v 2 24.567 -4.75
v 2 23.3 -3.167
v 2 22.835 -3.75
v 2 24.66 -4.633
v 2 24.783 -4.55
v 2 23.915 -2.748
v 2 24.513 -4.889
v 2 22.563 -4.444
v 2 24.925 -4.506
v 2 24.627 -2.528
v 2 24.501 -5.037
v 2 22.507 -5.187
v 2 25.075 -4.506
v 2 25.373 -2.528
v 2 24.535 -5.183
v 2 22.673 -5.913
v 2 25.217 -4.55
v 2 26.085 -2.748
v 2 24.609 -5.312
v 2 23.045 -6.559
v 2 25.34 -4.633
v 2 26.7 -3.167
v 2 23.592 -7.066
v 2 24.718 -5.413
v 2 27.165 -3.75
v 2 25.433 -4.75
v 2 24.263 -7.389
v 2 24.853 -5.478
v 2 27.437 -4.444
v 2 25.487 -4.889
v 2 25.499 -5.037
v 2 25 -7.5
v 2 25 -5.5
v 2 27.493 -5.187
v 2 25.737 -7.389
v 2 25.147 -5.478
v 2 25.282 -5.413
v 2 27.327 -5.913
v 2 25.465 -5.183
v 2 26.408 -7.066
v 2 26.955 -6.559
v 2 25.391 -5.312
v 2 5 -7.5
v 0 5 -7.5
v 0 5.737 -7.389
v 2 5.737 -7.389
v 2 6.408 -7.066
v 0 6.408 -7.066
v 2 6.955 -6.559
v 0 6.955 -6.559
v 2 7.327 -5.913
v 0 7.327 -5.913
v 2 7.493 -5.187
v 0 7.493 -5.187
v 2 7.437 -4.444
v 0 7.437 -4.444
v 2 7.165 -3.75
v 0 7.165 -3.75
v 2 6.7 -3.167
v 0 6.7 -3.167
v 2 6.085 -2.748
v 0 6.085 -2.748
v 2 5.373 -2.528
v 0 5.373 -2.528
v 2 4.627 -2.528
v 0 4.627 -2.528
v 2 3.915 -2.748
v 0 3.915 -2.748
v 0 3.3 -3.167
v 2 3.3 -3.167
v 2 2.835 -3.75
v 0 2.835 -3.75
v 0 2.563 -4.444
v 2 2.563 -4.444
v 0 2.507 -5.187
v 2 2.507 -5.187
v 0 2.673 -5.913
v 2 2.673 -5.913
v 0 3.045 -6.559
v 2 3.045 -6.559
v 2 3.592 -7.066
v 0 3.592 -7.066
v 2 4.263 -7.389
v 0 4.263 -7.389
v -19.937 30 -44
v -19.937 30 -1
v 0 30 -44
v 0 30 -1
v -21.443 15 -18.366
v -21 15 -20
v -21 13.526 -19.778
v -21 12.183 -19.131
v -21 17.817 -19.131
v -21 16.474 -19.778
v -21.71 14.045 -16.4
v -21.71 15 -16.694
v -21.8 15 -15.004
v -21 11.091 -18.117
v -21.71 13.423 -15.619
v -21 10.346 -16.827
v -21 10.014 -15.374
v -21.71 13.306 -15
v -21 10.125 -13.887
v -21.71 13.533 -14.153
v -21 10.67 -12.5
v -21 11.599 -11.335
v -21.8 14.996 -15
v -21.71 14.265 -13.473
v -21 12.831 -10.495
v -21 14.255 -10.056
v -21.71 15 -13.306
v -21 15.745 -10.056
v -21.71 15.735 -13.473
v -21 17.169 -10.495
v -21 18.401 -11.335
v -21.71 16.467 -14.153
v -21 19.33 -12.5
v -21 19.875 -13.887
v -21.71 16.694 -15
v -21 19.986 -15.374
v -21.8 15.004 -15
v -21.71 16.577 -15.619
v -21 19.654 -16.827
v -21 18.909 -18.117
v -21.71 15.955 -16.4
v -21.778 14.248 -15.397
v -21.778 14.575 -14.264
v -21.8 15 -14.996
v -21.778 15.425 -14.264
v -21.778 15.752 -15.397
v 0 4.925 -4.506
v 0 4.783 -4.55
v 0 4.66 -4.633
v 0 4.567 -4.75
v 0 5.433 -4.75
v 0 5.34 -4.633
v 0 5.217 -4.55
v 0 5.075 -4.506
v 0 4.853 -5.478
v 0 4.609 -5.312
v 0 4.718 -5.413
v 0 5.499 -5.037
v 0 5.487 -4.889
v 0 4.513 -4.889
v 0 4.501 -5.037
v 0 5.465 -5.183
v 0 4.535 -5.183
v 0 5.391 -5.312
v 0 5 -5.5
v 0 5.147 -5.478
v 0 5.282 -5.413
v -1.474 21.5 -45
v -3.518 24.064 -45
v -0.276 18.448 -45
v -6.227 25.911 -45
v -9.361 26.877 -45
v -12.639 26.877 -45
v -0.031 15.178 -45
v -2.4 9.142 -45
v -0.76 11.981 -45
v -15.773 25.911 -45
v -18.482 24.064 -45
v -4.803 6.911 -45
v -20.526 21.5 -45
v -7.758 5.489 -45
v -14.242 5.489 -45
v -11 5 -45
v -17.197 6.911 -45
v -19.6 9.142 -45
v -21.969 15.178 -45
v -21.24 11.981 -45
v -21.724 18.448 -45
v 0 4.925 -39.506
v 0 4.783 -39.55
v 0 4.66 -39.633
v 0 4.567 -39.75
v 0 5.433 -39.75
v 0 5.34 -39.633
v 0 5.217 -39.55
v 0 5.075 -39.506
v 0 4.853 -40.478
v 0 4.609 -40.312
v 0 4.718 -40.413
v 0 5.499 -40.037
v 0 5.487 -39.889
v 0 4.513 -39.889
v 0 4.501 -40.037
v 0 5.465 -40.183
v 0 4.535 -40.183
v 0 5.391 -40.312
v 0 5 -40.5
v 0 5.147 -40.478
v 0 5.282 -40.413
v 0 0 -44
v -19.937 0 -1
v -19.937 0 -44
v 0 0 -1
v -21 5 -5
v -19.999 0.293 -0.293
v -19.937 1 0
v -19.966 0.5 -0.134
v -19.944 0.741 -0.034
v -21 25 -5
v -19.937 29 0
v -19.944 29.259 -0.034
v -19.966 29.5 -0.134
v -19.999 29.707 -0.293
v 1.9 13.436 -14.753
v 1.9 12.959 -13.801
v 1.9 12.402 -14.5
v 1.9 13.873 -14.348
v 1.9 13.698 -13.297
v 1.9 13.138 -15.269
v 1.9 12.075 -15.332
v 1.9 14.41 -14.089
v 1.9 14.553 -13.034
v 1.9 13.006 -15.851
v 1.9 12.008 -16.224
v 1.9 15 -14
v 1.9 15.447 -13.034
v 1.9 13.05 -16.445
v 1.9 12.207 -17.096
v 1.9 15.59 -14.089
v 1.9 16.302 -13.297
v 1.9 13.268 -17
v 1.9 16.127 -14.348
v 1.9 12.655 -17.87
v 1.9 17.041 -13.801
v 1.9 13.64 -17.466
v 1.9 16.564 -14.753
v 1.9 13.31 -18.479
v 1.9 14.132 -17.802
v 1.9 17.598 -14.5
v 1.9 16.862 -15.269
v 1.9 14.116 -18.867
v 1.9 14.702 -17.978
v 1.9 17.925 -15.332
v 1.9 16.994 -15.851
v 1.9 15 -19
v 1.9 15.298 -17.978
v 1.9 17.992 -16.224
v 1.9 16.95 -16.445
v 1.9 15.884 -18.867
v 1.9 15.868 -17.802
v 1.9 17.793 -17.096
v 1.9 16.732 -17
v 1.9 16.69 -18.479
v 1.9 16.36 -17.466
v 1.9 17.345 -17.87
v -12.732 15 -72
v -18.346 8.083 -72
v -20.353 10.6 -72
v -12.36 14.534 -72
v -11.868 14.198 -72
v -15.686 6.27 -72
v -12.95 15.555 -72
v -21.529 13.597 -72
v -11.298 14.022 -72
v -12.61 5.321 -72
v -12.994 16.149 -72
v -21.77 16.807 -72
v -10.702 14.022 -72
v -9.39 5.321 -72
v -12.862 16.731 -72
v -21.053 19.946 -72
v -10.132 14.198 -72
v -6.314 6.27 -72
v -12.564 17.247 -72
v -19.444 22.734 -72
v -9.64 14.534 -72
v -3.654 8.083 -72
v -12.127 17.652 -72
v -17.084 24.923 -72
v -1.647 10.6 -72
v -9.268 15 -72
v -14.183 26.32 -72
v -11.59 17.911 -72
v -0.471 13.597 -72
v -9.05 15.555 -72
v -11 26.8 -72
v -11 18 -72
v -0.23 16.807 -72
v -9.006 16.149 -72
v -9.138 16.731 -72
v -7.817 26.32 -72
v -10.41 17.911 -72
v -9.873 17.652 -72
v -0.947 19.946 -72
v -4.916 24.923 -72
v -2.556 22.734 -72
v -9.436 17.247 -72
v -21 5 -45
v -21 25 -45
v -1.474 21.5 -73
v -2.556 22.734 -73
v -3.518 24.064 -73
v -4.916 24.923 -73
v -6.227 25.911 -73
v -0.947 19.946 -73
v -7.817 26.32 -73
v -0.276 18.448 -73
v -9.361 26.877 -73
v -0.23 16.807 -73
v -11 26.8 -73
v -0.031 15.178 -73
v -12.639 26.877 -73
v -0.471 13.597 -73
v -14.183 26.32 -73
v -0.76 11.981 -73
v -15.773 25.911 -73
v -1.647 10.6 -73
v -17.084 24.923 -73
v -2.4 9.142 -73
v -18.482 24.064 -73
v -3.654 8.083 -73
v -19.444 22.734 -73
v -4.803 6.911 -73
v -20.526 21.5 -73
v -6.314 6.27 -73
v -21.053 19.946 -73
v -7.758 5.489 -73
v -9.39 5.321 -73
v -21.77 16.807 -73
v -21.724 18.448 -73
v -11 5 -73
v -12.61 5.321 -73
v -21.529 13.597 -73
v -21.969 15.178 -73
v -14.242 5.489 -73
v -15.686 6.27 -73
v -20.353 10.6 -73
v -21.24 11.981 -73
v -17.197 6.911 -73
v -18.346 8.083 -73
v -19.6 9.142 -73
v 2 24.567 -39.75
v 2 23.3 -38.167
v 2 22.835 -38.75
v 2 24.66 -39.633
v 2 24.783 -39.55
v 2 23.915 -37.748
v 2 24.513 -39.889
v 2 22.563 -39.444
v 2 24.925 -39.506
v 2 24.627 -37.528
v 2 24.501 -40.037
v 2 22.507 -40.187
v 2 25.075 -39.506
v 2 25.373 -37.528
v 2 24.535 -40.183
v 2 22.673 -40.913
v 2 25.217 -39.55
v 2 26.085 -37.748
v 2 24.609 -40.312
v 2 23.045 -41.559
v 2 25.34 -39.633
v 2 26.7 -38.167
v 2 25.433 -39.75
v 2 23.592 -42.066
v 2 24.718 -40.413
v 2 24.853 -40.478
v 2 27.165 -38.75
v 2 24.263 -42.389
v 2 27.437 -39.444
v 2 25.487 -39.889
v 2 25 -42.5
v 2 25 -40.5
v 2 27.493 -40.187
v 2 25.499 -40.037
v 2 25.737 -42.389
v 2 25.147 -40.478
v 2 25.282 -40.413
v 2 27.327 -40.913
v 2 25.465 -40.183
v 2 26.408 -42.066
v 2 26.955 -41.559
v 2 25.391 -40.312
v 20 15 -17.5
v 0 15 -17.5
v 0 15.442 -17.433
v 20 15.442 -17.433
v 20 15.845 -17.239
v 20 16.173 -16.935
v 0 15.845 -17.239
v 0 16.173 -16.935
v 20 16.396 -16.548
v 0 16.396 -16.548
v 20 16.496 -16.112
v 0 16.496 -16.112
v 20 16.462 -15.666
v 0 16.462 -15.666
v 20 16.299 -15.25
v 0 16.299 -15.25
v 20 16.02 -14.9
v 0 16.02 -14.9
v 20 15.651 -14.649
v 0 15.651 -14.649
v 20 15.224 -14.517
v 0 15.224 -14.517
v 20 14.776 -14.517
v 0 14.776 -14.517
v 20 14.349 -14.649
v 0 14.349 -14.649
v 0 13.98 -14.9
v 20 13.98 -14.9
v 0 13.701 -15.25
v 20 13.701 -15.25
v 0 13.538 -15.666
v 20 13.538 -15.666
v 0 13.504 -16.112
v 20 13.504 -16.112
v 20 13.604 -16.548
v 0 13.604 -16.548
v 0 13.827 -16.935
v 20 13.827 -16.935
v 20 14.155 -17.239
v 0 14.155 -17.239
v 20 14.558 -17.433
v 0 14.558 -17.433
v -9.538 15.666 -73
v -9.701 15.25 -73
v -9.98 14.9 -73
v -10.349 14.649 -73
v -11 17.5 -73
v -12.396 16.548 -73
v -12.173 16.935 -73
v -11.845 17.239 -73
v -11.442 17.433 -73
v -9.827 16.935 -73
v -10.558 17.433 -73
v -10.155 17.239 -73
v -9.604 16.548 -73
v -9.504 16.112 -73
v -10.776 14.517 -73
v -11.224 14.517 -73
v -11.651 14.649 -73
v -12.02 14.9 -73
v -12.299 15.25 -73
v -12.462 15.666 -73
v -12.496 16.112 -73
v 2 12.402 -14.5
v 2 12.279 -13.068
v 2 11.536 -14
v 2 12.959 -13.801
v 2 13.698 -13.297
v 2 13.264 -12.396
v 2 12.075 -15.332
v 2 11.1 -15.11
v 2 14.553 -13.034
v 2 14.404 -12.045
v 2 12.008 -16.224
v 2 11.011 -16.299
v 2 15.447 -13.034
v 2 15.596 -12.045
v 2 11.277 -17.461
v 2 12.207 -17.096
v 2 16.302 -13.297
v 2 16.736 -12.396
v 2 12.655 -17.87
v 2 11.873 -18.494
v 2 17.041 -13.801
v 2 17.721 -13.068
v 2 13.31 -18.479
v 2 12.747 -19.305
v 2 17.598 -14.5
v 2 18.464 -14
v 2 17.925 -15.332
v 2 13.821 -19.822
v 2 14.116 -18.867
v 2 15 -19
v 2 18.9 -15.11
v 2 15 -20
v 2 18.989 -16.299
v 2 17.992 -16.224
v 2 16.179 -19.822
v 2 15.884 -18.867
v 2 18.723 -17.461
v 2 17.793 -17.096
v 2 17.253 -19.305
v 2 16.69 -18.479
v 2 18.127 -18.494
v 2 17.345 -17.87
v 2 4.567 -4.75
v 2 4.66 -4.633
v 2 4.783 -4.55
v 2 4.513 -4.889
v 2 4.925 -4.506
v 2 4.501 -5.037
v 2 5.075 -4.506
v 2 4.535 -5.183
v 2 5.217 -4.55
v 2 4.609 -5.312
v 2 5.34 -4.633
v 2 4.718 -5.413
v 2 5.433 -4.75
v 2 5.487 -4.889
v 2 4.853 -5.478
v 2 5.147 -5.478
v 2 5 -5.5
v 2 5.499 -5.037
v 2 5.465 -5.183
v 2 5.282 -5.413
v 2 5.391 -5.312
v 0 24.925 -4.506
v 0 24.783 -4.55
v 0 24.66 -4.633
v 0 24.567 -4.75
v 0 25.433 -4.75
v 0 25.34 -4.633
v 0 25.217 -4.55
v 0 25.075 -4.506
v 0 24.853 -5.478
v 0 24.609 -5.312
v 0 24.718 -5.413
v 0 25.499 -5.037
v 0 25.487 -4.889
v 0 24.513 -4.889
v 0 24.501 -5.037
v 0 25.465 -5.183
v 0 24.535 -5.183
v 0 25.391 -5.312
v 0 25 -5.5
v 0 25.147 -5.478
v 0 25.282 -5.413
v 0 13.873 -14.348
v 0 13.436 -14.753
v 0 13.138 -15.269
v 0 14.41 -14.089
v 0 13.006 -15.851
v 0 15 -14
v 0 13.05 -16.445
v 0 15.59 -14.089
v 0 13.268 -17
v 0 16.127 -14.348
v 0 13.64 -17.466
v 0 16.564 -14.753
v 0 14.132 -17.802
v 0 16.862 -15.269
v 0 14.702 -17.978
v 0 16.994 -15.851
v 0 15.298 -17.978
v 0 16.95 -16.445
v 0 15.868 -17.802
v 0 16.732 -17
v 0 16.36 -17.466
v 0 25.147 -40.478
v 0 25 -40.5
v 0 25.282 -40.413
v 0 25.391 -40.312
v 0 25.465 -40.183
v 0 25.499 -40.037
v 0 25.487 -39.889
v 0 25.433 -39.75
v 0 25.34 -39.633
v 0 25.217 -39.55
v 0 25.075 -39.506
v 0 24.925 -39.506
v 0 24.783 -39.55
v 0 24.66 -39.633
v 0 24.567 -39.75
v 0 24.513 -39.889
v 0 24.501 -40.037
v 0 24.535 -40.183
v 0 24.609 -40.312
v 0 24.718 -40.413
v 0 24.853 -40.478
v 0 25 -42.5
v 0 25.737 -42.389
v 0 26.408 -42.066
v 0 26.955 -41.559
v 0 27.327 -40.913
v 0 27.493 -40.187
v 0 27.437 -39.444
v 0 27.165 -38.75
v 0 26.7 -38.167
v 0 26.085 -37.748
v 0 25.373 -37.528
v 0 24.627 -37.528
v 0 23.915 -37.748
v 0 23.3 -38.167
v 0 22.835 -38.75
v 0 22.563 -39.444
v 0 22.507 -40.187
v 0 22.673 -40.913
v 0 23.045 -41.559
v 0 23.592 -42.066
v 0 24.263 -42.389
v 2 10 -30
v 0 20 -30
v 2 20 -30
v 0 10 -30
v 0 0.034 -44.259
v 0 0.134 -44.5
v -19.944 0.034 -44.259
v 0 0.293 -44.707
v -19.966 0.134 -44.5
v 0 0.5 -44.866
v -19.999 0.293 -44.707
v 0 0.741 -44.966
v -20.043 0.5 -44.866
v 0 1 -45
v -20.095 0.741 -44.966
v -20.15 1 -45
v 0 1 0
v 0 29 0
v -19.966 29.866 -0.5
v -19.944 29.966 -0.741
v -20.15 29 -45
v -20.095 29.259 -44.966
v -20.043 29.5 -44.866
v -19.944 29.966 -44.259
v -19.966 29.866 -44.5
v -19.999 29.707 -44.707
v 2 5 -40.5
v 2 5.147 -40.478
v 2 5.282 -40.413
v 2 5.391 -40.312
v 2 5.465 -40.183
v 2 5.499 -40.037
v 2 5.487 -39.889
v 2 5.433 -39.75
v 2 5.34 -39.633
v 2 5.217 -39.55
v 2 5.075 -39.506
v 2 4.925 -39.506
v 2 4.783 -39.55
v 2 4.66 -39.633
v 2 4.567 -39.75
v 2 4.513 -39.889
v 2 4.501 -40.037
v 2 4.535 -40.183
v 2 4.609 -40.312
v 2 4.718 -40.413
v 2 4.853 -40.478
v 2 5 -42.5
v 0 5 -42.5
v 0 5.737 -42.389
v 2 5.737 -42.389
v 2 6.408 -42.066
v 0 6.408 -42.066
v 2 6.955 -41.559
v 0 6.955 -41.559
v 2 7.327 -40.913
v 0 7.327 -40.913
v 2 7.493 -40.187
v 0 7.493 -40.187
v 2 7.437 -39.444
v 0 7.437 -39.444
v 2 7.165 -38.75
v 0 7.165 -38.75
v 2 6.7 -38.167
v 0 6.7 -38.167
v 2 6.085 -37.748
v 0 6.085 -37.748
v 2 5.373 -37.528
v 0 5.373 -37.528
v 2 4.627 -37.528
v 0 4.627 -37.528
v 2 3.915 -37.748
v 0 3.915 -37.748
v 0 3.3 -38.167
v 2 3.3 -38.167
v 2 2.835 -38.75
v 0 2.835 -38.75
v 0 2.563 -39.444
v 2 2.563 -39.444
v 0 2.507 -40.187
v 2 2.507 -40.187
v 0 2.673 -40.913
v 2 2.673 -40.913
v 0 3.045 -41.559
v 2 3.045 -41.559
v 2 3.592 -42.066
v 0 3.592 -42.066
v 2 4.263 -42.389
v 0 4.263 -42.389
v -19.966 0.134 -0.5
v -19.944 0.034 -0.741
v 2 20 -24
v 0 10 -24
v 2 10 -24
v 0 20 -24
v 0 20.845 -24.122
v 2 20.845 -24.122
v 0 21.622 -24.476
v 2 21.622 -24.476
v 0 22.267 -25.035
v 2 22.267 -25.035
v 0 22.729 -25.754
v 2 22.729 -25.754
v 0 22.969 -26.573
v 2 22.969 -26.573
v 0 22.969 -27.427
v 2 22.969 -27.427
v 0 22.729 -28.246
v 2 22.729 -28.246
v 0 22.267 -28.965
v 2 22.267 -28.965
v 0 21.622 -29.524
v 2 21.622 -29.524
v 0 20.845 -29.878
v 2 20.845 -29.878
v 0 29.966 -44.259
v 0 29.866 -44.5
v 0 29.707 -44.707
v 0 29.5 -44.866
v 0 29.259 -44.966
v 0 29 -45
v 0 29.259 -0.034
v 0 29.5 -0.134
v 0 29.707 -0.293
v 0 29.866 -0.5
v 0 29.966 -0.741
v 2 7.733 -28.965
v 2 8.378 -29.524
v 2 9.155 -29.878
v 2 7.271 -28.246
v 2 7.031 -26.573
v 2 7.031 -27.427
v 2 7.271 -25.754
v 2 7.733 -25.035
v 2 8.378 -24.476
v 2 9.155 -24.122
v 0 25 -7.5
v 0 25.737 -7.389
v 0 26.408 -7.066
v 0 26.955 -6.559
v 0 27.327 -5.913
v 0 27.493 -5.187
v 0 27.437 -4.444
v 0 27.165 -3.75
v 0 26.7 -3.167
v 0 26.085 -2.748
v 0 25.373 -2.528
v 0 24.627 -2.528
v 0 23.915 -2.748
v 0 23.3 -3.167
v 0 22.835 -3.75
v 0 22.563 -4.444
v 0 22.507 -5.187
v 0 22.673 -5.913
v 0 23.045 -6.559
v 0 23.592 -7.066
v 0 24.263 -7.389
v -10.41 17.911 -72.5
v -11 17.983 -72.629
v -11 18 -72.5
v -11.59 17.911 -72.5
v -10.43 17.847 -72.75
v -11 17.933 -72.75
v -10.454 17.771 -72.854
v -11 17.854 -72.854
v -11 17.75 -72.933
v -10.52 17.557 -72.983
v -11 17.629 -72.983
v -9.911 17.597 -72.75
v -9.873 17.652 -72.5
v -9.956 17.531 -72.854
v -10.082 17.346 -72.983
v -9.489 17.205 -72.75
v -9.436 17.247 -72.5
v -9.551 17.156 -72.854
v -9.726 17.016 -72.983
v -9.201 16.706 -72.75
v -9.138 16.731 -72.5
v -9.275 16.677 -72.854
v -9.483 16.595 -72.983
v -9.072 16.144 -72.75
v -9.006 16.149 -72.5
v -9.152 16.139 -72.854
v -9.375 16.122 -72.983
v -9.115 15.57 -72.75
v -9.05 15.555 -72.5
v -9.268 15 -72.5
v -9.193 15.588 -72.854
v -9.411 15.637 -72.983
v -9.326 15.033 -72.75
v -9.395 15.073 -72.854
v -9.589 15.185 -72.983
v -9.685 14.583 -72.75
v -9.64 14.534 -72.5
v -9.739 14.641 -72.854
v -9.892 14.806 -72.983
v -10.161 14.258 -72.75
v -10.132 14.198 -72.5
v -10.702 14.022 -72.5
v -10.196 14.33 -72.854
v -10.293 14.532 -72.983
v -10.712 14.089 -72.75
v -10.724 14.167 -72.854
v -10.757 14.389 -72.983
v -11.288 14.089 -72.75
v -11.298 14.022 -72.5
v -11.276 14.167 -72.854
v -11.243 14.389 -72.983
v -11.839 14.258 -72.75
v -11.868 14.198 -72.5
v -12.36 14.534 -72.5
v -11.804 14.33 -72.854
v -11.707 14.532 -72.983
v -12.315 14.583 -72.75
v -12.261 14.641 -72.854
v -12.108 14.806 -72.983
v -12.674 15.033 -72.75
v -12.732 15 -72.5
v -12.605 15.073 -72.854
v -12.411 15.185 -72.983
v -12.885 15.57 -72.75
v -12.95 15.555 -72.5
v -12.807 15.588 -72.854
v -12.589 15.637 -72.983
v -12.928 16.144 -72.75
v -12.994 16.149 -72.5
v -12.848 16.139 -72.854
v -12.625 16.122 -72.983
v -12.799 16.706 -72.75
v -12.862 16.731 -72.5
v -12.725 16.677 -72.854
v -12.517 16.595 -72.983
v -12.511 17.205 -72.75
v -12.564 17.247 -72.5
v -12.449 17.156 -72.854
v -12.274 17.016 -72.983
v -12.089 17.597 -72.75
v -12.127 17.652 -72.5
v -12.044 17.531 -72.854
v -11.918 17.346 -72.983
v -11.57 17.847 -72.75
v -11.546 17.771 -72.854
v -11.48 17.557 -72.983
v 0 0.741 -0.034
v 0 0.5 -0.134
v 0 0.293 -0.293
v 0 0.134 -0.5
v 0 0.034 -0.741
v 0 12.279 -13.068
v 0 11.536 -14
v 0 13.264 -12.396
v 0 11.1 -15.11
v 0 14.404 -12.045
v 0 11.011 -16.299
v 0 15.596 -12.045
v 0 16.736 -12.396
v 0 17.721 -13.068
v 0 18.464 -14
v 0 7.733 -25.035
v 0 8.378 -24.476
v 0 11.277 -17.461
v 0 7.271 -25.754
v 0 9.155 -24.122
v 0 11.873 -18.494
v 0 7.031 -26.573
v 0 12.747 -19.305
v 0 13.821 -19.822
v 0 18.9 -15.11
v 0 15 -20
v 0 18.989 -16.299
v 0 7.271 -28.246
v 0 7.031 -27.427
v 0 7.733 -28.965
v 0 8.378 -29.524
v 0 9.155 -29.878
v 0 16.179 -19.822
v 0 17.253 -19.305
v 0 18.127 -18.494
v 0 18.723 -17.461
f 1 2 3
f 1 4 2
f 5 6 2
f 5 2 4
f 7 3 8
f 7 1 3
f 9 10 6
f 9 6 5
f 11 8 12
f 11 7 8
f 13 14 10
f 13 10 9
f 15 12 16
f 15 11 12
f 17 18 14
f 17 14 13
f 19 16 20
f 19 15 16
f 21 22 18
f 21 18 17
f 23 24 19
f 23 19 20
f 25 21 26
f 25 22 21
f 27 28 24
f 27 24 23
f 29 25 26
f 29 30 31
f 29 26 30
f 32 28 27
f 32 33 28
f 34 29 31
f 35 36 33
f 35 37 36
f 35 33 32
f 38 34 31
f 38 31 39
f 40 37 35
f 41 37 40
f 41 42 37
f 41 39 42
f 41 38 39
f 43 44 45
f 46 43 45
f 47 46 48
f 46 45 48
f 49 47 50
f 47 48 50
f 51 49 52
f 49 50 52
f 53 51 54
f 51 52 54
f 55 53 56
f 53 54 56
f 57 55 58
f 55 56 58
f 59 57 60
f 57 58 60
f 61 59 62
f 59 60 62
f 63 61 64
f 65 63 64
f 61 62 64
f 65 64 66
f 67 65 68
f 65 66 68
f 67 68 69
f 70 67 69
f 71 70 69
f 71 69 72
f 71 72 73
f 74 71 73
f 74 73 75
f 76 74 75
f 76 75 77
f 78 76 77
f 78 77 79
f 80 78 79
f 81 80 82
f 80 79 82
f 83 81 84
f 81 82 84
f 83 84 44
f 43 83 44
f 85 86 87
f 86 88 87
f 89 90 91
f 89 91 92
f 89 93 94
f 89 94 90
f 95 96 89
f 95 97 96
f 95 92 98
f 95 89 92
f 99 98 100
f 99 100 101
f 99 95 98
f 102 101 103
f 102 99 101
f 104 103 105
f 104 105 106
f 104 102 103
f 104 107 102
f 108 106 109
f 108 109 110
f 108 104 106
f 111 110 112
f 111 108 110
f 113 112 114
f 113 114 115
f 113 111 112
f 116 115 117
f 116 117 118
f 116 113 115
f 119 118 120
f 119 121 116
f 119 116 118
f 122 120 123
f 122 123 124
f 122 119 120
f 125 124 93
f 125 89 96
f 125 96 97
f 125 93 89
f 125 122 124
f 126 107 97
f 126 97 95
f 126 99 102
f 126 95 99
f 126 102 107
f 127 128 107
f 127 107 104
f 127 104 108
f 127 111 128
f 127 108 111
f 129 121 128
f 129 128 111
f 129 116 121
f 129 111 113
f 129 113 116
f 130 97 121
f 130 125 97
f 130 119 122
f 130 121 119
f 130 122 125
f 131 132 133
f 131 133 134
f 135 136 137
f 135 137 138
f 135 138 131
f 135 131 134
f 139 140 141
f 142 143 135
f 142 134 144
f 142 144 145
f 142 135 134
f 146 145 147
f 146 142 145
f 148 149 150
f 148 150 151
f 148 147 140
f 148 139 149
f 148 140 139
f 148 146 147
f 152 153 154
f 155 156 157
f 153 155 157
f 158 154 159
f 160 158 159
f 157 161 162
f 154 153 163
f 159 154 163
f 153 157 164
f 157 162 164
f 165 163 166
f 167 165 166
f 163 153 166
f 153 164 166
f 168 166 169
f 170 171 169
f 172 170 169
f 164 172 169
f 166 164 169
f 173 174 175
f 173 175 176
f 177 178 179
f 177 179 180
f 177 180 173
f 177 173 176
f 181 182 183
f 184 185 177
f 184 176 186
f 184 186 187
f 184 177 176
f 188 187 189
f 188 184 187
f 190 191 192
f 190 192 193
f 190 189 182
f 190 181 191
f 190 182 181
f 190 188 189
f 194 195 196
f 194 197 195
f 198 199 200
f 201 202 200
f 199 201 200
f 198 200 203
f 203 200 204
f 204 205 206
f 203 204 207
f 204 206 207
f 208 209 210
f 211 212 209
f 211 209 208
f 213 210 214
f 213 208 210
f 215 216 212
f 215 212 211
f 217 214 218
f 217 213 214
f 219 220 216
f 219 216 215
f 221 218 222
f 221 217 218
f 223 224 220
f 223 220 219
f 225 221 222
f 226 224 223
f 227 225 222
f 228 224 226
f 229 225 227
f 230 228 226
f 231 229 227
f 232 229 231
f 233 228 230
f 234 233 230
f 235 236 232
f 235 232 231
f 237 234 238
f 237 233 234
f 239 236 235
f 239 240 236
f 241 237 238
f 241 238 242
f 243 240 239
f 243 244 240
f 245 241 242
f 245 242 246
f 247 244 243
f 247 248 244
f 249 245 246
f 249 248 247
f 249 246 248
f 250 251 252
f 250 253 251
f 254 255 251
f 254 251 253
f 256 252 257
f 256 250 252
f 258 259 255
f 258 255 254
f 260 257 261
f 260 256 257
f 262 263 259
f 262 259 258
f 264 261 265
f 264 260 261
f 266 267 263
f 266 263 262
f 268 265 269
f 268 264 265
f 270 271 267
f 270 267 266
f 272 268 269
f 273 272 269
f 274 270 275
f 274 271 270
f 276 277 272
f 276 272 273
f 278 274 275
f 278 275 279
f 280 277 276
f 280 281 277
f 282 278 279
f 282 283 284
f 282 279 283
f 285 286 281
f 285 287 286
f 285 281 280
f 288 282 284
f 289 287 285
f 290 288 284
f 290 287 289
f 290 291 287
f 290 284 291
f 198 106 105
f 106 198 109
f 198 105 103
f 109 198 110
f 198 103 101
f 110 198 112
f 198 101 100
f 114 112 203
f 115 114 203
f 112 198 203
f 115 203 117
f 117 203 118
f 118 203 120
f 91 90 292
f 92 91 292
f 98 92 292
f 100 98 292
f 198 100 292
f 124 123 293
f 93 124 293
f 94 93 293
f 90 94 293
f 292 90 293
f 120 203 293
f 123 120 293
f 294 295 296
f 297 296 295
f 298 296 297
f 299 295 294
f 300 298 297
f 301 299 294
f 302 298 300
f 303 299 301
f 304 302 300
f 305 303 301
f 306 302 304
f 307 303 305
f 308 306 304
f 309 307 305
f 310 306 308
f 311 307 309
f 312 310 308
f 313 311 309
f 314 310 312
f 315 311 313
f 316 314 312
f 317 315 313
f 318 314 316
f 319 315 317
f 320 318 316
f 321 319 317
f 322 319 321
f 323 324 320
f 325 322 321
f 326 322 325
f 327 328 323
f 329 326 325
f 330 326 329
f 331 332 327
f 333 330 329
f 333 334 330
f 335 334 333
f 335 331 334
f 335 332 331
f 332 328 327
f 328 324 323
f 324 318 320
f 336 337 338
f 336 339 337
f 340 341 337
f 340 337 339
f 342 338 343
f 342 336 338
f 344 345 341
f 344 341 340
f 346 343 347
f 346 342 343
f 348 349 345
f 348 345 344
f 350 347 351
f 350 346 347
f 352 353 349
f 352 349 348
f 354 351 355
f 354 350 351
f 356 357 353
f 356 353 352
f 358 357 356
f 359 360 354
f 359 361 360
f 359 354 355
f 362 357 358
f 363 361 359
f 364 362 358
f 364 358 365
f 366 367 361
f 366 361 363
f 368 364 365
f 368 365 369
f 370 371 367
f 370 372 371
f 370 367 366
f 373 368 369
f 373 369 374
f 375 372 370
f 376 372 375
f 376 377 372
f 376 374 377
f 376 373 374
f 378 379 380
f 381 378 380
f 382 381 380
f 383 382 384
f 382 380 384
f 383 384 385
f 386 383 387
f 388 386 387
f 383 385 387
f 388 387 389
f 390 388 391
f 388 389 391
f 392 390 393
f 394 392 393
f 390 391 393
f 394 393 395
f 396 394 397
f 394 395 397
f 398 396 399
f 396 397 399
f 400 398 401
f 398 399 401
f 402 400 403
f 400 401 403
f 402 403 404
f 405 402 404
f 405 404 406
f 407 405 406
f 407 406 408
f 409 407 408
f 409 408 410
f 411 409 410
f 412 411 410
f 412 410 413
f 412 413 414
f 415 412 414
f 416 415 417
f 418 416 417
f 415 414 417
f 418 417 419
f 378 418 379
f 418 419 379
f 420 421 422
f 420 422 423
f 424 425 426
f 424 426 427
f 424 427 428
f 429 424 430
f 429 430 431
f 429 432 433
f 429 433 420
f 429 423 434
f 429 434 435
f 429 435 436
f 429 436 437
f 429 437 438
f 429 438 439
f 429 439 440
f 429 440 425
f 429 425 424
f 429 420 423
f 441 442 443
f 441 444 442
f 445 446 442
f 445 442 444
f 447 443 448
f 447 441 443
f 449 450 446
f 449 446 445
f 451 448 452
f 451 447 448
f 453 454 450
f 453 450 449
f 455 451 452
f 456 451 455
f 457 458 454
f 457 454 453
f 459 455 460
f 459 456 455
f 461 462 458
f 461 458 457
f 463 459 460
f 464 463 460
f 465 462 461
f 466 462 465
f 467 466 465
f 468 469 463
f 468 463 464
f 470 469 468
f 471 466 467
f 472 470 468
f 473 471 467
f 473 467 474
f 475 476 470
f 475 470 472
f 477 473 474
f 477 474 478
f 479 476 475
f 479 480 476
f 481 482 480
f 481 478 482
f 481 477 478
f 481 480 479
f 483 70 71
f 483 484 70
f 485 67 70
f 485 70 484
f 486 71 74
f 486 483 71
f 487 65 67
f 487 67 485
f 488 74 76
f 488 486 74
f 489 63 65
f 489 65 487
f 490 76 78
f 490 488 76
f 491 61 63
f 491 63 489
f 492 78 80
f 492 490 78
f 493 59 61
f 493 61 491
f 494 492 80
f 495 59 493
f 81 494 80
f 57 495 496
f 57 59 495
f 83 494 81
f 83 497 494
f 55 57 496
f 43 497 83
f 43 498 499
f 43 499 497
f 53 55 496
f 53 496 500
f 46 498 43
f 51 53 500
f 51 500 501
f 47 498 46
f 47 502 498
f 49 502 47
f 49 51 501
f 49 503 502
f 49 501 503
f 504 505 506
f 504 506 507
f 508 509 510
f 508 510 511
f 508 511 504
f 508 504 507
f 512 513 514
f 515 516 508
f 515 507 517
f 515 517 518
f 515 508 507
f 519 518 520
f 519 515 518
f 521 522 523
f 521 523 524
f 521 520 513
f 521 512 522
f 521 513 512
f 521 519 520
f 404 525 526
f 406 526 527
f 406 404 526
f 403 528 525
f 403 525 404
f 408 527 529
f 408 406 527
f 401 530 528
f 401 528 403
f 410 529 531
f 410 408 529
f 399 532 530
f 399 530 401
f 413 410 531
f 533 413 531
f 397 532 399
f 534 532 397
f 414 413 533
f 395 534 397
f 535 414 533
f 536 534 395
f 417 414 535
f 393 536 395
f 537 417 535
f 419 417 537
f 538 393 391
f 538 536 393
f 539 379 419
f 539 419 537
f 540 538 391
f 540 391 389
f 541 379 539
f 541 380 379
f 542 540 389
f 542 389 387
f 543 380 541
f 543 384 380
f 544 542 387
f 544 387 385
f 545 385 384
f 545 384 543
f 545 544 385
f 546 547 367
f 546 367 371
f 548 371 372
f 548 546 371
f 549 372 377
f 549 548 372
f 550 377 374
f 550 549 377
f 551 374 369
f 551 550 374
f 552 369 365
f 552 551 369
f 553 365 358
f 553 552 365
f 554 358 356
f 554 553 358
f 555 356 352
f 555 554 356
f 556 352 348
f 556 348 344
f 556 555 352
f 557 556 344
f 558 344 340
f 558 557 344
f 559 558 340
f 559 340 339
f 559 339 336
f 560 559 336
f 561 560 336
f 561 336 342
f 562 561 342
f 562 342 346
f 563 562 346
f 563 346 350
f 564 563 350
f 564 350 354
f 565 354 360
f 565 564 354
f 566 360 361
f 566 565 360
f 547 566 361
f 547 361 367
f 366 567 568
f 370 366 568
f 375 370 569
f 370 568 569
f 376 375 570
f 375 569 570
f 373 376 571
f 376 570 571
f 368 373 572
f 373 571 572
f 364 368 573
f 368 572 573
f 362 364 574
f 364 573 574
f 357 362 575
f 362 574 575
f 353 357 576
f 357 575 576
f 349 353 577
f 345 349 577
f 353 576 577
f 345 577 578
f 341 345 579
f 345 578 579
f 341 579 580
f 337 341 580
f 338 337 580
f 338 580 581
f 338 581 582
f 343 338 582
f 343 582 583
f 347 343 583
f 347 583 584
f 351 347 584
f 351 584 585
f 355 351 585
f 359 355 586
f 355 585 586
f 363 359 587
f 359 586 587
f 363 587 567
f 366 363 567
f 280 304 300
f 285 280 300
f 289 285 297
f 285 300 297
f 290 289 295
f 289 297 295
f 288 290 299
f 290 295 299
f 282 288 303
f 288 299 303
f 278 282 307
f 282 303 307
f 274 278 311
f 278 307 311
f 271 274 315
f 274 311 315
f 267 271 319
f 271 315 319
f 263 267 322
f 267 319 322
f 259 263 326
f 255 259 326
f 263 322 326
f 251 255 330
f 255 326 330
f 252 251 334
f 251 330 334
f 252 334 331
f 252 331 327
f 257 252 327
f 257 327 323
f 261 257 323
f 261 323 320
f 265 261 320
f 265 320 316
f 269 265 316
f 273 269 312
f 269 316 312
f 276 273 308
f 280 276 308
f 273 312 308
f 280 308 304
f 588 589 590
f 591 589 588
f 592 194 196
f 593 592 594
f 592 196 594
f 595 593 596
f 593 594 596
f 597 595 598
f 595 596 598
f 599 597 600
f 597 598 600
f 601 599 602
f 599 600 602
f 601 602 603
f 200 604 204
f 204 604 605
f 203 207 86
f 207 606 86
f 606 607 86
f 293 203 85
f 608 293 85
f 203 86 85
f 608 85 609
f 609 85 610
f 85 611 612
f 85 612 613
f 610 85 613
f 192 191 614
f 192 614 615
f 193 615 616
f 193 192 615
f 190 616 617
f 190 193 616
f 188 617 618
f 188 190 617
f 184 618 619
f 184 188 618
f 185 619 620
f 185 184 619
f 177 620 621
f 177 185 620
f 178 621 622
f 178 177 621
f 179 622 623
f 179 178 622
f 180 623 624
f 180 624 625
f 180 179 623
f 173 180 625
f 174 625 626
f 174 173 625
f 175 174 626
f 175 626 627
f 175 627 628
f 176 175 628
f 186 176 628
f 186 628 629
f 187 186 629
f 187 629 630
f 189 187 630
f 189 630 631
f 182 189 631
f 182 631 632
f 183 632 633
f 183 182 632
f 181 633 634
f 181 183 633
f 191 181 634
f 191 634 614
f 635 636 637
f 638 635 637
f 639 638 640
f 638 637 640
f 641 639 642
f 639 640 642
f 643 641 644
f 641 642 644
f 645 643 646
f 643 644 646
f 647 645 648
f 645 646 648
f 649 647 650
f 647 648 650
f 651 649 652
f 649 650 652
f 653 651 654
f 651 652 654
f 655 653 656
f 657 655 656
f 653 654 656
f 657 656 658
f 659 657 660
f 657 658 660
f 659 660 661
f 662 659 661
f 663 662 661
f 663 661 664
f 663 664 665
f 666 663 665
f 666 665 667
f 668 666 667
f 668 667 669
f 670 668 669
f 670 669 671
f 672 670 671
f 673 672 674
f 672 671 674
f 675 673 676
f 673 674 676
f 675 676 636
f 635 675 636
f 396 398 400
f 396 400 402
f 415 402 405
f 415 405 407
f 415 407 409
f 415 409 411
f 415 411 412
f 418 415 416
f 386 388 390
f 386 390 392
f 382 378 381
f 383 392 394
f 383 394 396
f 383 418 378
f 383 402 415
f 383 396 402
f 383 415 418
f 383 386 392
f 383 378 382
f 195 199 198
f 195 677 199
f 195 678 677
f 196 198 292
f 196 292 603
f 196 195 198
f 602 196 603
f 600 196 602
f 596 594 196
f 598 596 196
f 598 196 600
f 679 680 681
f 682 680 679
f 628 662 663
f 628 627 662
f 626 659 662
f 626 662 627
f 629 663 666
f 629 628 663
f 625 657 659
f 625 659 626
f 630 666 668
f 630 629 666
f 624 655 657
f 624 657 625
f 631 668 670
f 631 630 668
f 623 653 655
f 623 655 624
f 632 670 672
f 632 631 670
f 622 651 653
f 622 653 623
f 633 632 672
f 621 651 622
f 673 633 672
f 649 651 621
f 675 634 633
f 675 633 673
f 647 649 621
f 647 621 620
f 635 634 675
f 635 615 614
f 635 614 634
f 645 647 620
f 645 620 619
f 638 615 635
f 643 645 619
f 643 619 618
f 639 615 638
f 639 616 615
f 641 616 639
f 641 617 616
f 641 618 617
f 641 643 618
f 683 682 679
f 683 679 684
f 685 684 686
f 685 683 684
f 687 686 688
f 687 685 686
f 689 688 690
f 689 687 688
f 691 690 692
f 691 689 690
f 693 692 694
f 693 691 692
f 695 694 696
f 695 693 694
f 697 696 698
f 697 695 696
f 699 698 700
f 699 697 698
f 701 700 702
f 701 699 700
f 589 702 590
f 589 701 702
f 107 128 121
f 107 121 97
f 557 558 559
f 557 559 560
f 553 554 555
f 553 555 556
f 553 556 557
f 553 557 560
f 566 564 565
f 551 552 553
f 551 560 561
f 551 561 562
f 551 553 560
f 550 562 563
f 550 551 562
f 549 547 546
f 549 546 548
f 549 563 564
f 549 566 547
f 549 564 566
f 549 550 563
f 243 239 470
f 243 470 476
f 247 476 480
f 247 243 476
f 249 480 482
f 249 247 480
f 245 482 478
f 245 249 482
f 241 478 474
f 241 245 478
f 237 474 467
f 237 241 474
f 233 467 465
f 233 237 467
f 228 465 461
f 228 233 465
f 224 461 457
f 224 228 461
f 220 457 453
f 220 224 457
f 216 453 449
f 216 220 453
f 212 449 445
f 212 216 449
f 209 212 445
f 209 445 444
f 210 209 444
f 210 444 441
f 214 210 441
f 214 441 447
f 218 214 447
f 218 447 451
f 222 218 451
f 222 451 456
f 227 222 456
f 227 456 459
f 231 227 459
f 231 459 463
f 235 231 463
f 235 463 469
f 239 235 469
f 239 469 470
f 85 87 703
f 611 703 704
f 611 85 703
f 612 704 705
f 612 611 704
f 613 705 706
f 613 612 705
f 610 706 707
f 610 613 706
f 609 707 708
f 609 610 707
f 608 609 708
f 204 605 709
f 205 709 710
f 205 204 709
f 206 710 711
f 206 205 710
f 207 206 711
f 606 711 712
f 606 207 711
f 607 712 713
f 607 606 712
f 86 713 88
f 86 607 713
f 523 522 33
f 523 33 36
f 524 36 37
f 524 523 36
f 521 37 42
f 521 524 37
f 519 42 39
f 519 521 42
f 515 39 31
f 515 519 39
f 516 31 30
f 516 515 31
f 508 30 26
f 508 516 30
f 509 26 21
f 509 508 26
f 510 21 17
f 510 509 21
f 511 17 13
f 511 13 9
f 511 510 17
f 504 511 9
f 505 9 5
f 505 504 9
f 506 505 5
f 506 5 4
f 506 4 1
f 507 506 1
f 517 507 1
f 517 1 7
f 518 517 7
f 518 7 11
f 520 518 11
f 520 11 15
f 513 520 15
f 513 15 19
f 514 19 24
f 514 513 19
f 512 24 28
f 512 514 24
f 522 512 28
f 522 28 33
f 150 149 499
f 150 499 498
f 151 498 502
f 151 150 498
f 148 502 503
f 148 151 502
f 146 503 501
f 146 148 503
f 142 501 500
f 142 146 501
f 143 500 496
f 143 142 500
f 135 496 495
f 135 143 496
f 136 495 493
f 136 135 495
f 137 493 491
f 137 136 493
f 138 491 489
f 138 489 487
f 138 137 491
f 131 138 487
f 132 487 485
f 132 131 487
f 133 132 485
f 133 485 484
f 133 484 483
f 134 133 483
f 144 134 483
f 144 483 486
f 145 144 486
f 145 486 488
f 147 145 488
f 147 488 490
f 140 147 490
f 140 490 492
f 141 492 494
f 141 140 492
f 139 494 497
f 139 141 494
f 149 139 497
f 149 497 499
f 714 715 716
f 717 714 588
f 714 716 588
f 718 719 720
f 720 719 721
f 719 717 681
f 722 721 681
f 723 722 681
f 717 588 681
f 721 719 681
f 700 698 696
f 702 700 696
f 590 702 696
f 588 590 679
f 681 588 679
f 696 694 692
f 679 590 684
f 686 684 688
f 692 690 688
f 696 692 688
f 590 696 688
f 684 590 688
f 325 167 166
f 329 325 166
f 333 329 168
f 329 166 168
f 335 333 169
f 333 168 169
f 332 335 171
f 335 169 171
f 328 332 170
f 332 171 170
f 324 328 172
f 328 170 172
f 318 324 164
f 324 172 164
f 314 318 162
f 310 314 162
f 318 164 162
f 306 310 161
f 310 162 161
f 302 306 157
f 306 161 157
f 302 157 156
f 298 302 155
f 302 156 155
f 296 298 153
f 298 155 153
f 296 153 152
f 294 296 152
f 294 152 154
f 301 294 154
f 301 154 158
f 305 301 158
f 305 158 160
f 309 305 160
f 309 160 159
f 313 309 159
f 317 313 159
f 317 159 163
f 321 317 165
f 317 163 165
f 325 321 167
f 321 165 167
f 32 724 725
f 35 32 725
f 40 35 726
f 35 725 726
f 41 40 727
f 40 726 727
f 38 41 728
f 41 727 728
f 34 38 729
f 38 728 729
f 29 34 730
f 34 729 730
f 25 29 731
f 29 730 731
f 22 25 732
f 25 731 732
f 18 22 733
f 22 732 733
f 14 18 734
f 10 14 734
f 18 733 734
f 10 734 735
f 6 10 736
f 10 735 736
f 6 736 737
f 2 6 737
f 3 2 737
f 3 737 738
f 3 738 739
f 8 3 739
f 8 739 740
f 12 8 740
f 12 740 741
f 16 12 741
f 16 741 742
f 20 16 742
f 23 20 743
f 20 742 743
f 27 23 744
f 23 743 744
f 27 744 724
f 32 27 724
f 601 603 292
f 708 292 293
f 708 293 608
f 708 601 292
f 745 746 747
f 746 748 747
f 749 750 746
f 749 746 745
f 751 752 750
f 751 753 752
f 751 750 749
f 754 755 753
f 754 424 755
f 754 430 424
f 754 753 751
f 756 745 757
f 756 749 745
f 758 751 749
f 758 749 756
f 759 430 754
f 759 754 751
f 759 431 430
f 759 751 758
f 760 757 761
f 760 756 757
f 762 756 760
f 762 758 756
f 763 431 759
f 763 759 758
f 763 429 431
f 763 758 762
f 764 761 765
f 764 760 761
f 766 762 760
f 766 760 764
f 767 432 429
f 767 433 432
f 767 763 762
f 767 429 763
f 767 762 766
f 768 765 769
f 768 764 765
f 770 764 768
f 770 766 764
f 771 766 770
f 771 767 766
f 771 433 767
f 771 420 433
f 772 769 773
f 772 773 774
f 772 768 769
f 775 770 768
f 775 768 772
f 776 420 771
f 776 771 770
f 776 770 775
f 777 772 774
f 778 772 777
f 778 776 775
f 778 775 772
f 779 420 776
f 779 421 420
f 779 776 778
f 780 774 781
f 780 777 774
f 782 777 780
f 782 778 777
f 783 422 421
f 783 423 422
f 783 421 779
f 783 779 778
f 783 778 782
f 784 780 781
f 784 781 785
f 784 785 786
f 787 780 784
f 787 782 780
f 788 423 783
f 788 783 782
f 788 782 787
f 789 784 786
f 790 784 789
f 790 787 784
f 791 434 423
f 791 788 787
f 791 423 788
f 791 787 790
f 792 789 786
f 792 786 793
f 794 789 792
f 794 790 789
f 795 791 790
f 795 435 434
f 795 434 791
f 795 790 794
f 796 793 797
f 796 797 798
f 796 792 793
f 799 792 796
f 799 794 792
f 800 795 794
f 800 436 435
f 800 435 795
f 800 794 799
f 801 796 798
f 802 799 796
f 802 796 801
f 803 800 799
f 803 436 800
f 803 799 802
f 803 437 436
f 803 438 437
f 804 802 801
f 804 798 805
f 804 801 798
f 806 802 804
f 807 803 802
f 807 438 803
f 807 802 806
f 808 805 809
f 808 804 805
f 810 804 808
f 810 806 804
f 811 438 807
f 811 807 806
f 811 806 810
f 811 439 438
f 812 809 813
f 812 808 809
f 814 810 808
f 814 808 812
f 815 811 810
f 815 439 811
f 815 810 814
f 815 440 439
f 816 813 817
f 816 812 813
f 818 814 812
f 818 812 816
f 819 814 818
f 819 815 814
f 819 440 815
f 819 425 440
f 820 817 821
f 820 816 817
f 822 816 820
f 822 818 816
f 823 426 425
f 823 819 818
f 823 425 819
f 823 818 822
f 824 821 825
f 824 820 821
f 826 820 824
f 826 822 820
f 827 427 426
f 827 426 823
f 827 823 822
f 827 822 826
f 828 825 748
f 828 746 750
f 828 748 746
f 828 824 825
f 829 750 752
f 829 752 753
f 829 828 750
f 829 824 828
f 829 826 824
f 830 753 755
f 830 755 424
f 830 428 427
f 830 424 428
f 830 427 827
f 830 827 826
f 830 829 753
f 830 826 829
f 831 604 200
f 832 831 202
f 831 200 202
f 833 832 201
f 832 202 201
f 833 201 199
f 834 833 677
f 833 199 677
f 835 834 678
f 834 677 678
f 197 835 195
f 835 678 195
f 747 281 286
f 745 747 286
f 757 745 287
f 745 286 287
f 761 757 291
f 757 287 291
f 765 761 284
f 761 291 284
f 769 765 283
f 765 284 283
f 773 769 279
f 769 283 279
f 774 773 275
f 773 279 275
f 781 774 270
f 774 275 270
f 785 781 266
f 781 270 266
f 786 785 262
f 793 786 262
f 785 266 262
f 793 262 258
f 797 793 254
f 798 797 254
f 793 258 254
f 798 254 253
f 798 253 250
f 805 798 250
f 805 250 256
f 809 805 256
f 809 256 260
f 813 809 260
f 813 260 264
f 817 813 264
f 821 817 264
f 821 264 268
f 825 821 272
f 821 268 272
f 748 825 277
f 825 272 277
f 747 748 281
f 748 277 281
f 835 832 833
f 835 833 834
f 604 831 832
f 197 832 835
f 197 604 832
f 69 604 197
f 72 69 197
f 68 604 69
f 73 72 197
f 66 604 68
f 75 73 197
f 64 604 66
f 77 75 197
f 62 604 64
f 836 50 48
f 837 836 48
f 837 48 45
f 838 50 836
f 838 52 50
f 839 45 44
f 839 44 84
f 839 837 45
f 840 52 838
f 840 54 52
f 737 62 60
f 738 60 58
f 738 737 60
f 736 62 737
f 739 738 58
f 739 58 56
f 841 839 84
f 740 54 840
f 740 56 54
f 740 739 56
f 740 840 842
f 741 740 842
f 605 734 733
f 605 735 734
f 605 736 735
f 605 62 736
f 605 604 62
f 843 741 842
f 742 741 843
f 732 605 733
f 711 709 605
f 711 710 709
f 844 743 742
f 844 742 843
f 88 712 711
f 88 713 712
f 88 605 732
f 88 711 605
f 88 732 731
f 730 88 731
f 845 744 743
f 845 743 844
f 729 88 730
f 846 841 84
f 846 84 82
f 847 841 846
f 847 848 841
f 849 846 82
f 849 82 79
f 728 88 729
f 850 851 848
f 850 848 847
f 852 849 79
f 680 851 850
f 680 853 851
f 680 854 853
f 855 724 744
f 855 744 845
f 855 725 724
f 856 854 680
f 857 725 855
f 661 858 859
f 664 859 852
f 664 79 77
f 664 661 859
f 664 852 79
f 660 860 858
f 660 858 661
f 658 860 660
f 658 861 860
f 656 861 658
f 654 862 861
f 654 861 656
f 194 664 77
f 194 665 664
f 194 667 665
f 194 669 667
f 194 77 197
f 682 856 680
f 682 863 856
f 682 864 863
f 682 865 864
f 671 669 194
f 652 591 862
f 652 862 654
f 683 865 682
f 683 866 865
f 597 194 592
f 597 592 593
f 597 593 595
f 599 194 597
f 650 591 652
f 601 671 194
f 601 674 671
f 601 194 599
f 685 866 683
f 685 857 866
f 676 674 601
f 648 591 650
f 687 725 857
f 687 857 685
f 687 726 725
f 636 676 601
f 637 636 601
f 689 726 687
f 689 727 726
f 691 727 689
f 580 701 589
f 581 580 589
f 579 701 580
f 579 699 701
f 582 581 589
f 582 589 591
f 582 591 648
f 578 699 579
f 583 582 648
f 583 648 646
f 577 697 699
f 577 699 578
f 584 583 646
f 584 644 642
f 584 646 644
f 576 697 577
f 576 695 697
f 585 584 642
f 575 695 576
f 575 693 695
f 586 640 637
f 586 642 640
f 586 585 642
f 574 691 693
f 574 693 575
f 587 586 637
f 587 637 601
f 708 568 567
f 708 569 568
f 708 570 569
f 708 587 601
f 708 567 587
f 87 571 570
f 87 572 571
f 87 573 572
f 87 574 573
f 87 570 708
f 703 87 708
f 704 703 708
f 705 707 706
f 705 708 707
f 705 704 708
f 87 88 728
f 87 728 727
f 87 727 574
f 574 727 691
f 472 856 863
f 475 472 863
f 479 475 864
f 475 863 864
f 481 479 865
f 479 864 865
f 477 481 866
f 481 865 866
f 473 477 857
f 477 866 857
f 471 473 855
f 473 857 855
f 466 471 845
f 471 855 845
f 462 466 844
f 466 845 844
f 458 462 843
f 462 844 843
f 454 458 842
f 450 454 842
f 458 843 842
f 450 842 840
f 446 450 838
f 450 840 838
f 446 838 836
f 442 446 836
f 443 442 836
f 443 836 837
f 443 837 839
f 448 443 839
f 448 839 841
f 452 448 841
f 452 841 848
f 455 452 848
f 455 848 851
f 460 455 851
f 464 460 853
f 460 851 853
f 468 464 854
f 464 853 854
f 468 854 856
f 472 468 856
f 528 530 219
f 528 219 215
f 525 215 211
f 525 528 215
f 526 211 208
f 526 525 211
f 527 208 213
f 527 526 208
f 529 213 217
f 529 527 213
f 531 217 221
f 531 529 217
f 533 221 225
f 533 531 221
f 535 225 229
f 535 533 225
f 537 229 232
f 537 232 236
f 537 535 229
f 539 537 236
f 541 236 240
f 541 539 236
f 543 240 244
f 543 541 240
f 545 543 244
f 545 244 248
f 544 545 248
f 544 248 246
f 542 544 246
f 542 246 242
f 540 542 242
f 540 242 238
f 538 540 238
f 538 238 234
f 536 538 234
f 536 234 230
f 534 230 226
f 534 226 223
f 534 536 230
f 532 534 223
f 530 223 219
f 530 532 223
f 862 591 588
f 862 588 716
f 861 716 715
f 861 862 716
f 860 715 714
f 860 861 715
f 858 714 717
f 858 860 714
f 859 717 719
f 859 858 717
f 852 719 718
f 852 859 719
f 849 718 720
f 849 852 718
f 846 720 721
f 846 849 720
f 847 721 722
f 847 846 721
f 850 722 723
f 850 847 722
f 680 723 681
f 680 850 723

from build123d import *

# Parameters (mm, degrees)
SKETCH1_W           = 45
SKETCH1_H           = 30
BOSS_EXTRUDE1_DEPTH = 21
SKETCH2_R           = 2.5
SKETCH2_R_2         = 0.5
SKETCH2_R_3         = 4
SKETCH2_R_4         = 3
BOSS_EXTRUDE2_DEPTH = 2
SKETCH3_R           = 3
SKETCH3_R_2         = 2
BOSS_EXTRUDE3_DEPTH = 1.9
SKETCH4_R           = 1.5
BOSS_EXTRUDE4_DEPTH = 20
BOSS_EXTRUDE5_DEPTH = 2
CHAMFER1_SIZE       = 5
CHAMFER1_SIZE2      = 1.062782808
SKETCH7_R           = 5
BOSS_EXTRUDE6_DEPTH = 0.8
FILLET2_R           = 16
SKETCH8_R           = 11
BOSS_EXTRUDE7_DEPTH = 28
SKETCH9_R           = 10.8
CUT_EXTRUDE1_DEPTH  = 1
SKETCH10_R          = 2
BOSS_EXTRUDE8_DEPTH = 1
FILLET3_R           = 0.5
FILLET4_R           = 1


with BuildPart() as part:
    # Sketch1 → Boss-Extrude1 (new body)
    with BuildSketch(Plane(origin=(0, 0, 0), x_dir=(0, 0, -1), z_dir=(1, 0, 0))):
        with Locations((22.5, 15)):
            Rectangle(SKETCH1_W, SKETCH1_H)
    extrude(amount=-BOSS_EXTRUDE1_DEPTH)

    # Sketch2 → Boss-Extrude2 (add)
    # profile 1 of 5: a face of its own
    with BuildSketch(Plane(origin=(0, 0, 0), x_dir=(0, 0, -1), z_dir=(1, 0, 0))):
        with Locations((5, 25)):
            Circle(SKETCH2_R)
        with Locations((5, 25)):
            Circle(SKETCH2_R_2, mode=Mode.SUBTRACT)
    # profile 2 of 5: a face of its own
    with BuildSketch(Plane(origin=(0, 0, 0), x_dir=(0, 0, -1), z_dir=(1, 0, 0))):
        with Locations((5, 5)):
            Circle(SKETCH2_R)
        with Locations((5, 5)):
            Circle(SKETCH2_R_2, mode=Mode.SUBTRACT)
    # profile 3 of 5: a face of its own
    with BuildSketch(Plane(origin=(0, 0, 0), x_dir=(0, 0, -1), z_dir=(1, 0, 0))):
        with Locations((40, 5)):
            Circle(SKETCH2_R)
        with Locations((40, 5)):
            Circle(SKETCH2_R_2, mode=Mode.SUBTRACT)
    # profile 4 of 5: a face of its own
    with BuildSketch(Plane(origin=(0, 0, 0), x_dir=(0, 0, -1), z_dir=(1, 0, 0))):
        with Locations((40, 25)):
            Circle(SKETCH2_R)
        with Locations((40, 25)):
            Circle(SKETCH2_R_2, mode=Mode.SUBTRACT)
    # profile 5 of 5: a face of its own
    with BuildSketch(Plane(origin=(0, 0, 0), x_dir=(0, 0, -1), z_dir=(1, 0, 0))):
        with Locations((16, 15)):
            Circle(SKETCH2_R_3)
        with Locations((16, 15)):
            Circle(SKETCH2_R_4, mode=Mode.SUBTRACT)
    extrude(amount=BOSS_EXTRUDE2_DEPTH)



with BuildPart() as body_2:
    # Sketch3 → Boss-Extrude3 (new body)
    with BuildSketch(Plane(origin=(0, 0, 0), x_dir=(0, 0, -1), z_dir=(1, 0, 0))):
        with Locations((16, 15)):
            Circle(SKETCH3_R)
        with Locations(Location((16, 15, 0), (0, 0, 180))):
            Circle(SKETCH3_R_2, mode=Mode.SUBTRACT)
    extrude(amount=BOSS_EXTRUDE3_DEPTH)


with BuildPart() as part_1:
    add(part.part)

    add(body_2.part)  # Boss-Extrude4 merges body 2
    # Sketch4 → Boss-Extrude4 (add)
    with BuildSketch(Plane(origin=(0, 0, 0), x_dir=(0, 0, -1), z_dir=(1, 0, 0))):
        with Locations((16, 15)):
            Circle(SKETCH4_R)
    extrude(amount=BOSS_EXTRUDE4_DEPTH)

    # Sketch6 → Boss-Extrude5 (add)
    with BuildSketch(Plane(origin=(0, 0, 0), x_dir=(0, 0, -1), z_dir=(1, 0, 0))):
        with BuildLine():
            Line((30, 20), (30, 10))
            ThreePointArc((30, 10), (27, 7), (24, 10))
            Line((24, 10), (24, 20))
            ThreePointArc((24, 20), (27, 23), (30, 20))
        make_face()
    extrude(amount=BOSS_EXTRUDE5_DEPTH)

    # Chamfer1
    chamfer1_edges = [part_1.edges().sort_by_distance(p)[0] for p in [
        (-21, 30, -22.5),
        (-21, 15, 0),
        (-21, 0, -22.5),
    ]]
    chamfer1_side = [part_1.faces().sort_by_distance(p)[0] for p in [
        (-21, 15, -22.5),
    ]]
    chamfer(chamfer1_edges, length=CHAMFER1_SIZE, length2=CHAMFER1_SIZE2, reference=chamfer1_side[0])

    # Sketch7 → Boss-Extrude6 (add)
    with BuildSketch(Plane.ZY.offset(21)):
        with Locations(Location((-15, 15, 0), (0, 0, 180))):
            Circle(SKETCH7_R)
    extrude(amount=BOSS_EXTRUDE6_DEPTH)

    # Fillet2
    # the kernel refuses this fillet: 16 mm, written as the material it takes off along each edge
    with BuildSketch(Plane(origin=(-21.8, 15, -15), x_dir=(0, 0, -1), z_dir=(0, 1, 0))) as fillet2_piece_1:
        with BuildLine():
            CenterArc((0.004001601, -16), FILLET2_R, 71.805127661, 18.194872339)
            Line((0.004001601, 0), (0.004001601, 0.32))
            Line((0.004001601, 0.32), (5, 0.32))
            Line((5, 0.32), (5.32, 0))
            ThreePointArc((5.32, 0), (5.32, -0.4), (5.099919968, -0.496))
            Line((5.099919968, -0.496), (5, -0.8))
        make_face()
    revolve(axis=Axis((-21.8, 15, -15), (-1, 0, 0)), mode=Mode.SUBTRACT)

    # Fillet4
    fillet4_edges = [part_1.edges().sort_by_distance(p)[0] for p in [
        (-9.968608596, 30, -45),
        (-9.968608596, 30, 0),
        (-9.968608596, 0, -45),
        (-9.968608596, 0, 0),
    ]]
    fillet(fillet4_edges, radius=FILLET4_R)


with BuildPart() as body_2_2:
    # Sketch8 → Boss-Extrude7 (new body)
    with BuildSketch(Plane(origin=(0, 0, -45), x_dir=(-1, 0, 0), z_dir=(0, 0, -1))):
        with Locations(Location((11, 16, 0), (0, 0, 270))):
            Circle(SKETCH8_R)
    extrude(amount=BOSS_EXTRUDE7_DEPTH)

    # Sketch9 → Cut-Extrude1 (cut)
    with BuildSketch(Plane(origin=(0, 0, -73), x_dir=(-1, 0, 0), z_dir=(0, 0, -1))):
        with Locations(Location((11, 16, 0), (0, 0, 90))):
            Circle(SKETCH9_R)
    extrude(amount=-CUT_EXTRUDE1_DEPTH, mode=Mode.SUBTRACT)

    # Sketch10 → Boss-Extrude8 (add)
    with BuildSketch(Plane(origin=(0, 0, -72), x_dir=(-1, 0, 0), z_dir=(0, 0, -1))):
        with Locations(Location((11, 16, 0), (0, 0, 90))):
            Circle(SKETCH10_R)
    extrude(amount=BOSS_EXTRUDE8_DEPTH)

    # Fillet3
    fillet3_edges = [body_2_2.edges().sort_by_distance(p)[0] for p in [
        (-11, 14, -73),
    ]]
    fillet(fillet3_edges, radius=FILLET3_R)


solid = Compound([part_1.part, body_2_2.part])
